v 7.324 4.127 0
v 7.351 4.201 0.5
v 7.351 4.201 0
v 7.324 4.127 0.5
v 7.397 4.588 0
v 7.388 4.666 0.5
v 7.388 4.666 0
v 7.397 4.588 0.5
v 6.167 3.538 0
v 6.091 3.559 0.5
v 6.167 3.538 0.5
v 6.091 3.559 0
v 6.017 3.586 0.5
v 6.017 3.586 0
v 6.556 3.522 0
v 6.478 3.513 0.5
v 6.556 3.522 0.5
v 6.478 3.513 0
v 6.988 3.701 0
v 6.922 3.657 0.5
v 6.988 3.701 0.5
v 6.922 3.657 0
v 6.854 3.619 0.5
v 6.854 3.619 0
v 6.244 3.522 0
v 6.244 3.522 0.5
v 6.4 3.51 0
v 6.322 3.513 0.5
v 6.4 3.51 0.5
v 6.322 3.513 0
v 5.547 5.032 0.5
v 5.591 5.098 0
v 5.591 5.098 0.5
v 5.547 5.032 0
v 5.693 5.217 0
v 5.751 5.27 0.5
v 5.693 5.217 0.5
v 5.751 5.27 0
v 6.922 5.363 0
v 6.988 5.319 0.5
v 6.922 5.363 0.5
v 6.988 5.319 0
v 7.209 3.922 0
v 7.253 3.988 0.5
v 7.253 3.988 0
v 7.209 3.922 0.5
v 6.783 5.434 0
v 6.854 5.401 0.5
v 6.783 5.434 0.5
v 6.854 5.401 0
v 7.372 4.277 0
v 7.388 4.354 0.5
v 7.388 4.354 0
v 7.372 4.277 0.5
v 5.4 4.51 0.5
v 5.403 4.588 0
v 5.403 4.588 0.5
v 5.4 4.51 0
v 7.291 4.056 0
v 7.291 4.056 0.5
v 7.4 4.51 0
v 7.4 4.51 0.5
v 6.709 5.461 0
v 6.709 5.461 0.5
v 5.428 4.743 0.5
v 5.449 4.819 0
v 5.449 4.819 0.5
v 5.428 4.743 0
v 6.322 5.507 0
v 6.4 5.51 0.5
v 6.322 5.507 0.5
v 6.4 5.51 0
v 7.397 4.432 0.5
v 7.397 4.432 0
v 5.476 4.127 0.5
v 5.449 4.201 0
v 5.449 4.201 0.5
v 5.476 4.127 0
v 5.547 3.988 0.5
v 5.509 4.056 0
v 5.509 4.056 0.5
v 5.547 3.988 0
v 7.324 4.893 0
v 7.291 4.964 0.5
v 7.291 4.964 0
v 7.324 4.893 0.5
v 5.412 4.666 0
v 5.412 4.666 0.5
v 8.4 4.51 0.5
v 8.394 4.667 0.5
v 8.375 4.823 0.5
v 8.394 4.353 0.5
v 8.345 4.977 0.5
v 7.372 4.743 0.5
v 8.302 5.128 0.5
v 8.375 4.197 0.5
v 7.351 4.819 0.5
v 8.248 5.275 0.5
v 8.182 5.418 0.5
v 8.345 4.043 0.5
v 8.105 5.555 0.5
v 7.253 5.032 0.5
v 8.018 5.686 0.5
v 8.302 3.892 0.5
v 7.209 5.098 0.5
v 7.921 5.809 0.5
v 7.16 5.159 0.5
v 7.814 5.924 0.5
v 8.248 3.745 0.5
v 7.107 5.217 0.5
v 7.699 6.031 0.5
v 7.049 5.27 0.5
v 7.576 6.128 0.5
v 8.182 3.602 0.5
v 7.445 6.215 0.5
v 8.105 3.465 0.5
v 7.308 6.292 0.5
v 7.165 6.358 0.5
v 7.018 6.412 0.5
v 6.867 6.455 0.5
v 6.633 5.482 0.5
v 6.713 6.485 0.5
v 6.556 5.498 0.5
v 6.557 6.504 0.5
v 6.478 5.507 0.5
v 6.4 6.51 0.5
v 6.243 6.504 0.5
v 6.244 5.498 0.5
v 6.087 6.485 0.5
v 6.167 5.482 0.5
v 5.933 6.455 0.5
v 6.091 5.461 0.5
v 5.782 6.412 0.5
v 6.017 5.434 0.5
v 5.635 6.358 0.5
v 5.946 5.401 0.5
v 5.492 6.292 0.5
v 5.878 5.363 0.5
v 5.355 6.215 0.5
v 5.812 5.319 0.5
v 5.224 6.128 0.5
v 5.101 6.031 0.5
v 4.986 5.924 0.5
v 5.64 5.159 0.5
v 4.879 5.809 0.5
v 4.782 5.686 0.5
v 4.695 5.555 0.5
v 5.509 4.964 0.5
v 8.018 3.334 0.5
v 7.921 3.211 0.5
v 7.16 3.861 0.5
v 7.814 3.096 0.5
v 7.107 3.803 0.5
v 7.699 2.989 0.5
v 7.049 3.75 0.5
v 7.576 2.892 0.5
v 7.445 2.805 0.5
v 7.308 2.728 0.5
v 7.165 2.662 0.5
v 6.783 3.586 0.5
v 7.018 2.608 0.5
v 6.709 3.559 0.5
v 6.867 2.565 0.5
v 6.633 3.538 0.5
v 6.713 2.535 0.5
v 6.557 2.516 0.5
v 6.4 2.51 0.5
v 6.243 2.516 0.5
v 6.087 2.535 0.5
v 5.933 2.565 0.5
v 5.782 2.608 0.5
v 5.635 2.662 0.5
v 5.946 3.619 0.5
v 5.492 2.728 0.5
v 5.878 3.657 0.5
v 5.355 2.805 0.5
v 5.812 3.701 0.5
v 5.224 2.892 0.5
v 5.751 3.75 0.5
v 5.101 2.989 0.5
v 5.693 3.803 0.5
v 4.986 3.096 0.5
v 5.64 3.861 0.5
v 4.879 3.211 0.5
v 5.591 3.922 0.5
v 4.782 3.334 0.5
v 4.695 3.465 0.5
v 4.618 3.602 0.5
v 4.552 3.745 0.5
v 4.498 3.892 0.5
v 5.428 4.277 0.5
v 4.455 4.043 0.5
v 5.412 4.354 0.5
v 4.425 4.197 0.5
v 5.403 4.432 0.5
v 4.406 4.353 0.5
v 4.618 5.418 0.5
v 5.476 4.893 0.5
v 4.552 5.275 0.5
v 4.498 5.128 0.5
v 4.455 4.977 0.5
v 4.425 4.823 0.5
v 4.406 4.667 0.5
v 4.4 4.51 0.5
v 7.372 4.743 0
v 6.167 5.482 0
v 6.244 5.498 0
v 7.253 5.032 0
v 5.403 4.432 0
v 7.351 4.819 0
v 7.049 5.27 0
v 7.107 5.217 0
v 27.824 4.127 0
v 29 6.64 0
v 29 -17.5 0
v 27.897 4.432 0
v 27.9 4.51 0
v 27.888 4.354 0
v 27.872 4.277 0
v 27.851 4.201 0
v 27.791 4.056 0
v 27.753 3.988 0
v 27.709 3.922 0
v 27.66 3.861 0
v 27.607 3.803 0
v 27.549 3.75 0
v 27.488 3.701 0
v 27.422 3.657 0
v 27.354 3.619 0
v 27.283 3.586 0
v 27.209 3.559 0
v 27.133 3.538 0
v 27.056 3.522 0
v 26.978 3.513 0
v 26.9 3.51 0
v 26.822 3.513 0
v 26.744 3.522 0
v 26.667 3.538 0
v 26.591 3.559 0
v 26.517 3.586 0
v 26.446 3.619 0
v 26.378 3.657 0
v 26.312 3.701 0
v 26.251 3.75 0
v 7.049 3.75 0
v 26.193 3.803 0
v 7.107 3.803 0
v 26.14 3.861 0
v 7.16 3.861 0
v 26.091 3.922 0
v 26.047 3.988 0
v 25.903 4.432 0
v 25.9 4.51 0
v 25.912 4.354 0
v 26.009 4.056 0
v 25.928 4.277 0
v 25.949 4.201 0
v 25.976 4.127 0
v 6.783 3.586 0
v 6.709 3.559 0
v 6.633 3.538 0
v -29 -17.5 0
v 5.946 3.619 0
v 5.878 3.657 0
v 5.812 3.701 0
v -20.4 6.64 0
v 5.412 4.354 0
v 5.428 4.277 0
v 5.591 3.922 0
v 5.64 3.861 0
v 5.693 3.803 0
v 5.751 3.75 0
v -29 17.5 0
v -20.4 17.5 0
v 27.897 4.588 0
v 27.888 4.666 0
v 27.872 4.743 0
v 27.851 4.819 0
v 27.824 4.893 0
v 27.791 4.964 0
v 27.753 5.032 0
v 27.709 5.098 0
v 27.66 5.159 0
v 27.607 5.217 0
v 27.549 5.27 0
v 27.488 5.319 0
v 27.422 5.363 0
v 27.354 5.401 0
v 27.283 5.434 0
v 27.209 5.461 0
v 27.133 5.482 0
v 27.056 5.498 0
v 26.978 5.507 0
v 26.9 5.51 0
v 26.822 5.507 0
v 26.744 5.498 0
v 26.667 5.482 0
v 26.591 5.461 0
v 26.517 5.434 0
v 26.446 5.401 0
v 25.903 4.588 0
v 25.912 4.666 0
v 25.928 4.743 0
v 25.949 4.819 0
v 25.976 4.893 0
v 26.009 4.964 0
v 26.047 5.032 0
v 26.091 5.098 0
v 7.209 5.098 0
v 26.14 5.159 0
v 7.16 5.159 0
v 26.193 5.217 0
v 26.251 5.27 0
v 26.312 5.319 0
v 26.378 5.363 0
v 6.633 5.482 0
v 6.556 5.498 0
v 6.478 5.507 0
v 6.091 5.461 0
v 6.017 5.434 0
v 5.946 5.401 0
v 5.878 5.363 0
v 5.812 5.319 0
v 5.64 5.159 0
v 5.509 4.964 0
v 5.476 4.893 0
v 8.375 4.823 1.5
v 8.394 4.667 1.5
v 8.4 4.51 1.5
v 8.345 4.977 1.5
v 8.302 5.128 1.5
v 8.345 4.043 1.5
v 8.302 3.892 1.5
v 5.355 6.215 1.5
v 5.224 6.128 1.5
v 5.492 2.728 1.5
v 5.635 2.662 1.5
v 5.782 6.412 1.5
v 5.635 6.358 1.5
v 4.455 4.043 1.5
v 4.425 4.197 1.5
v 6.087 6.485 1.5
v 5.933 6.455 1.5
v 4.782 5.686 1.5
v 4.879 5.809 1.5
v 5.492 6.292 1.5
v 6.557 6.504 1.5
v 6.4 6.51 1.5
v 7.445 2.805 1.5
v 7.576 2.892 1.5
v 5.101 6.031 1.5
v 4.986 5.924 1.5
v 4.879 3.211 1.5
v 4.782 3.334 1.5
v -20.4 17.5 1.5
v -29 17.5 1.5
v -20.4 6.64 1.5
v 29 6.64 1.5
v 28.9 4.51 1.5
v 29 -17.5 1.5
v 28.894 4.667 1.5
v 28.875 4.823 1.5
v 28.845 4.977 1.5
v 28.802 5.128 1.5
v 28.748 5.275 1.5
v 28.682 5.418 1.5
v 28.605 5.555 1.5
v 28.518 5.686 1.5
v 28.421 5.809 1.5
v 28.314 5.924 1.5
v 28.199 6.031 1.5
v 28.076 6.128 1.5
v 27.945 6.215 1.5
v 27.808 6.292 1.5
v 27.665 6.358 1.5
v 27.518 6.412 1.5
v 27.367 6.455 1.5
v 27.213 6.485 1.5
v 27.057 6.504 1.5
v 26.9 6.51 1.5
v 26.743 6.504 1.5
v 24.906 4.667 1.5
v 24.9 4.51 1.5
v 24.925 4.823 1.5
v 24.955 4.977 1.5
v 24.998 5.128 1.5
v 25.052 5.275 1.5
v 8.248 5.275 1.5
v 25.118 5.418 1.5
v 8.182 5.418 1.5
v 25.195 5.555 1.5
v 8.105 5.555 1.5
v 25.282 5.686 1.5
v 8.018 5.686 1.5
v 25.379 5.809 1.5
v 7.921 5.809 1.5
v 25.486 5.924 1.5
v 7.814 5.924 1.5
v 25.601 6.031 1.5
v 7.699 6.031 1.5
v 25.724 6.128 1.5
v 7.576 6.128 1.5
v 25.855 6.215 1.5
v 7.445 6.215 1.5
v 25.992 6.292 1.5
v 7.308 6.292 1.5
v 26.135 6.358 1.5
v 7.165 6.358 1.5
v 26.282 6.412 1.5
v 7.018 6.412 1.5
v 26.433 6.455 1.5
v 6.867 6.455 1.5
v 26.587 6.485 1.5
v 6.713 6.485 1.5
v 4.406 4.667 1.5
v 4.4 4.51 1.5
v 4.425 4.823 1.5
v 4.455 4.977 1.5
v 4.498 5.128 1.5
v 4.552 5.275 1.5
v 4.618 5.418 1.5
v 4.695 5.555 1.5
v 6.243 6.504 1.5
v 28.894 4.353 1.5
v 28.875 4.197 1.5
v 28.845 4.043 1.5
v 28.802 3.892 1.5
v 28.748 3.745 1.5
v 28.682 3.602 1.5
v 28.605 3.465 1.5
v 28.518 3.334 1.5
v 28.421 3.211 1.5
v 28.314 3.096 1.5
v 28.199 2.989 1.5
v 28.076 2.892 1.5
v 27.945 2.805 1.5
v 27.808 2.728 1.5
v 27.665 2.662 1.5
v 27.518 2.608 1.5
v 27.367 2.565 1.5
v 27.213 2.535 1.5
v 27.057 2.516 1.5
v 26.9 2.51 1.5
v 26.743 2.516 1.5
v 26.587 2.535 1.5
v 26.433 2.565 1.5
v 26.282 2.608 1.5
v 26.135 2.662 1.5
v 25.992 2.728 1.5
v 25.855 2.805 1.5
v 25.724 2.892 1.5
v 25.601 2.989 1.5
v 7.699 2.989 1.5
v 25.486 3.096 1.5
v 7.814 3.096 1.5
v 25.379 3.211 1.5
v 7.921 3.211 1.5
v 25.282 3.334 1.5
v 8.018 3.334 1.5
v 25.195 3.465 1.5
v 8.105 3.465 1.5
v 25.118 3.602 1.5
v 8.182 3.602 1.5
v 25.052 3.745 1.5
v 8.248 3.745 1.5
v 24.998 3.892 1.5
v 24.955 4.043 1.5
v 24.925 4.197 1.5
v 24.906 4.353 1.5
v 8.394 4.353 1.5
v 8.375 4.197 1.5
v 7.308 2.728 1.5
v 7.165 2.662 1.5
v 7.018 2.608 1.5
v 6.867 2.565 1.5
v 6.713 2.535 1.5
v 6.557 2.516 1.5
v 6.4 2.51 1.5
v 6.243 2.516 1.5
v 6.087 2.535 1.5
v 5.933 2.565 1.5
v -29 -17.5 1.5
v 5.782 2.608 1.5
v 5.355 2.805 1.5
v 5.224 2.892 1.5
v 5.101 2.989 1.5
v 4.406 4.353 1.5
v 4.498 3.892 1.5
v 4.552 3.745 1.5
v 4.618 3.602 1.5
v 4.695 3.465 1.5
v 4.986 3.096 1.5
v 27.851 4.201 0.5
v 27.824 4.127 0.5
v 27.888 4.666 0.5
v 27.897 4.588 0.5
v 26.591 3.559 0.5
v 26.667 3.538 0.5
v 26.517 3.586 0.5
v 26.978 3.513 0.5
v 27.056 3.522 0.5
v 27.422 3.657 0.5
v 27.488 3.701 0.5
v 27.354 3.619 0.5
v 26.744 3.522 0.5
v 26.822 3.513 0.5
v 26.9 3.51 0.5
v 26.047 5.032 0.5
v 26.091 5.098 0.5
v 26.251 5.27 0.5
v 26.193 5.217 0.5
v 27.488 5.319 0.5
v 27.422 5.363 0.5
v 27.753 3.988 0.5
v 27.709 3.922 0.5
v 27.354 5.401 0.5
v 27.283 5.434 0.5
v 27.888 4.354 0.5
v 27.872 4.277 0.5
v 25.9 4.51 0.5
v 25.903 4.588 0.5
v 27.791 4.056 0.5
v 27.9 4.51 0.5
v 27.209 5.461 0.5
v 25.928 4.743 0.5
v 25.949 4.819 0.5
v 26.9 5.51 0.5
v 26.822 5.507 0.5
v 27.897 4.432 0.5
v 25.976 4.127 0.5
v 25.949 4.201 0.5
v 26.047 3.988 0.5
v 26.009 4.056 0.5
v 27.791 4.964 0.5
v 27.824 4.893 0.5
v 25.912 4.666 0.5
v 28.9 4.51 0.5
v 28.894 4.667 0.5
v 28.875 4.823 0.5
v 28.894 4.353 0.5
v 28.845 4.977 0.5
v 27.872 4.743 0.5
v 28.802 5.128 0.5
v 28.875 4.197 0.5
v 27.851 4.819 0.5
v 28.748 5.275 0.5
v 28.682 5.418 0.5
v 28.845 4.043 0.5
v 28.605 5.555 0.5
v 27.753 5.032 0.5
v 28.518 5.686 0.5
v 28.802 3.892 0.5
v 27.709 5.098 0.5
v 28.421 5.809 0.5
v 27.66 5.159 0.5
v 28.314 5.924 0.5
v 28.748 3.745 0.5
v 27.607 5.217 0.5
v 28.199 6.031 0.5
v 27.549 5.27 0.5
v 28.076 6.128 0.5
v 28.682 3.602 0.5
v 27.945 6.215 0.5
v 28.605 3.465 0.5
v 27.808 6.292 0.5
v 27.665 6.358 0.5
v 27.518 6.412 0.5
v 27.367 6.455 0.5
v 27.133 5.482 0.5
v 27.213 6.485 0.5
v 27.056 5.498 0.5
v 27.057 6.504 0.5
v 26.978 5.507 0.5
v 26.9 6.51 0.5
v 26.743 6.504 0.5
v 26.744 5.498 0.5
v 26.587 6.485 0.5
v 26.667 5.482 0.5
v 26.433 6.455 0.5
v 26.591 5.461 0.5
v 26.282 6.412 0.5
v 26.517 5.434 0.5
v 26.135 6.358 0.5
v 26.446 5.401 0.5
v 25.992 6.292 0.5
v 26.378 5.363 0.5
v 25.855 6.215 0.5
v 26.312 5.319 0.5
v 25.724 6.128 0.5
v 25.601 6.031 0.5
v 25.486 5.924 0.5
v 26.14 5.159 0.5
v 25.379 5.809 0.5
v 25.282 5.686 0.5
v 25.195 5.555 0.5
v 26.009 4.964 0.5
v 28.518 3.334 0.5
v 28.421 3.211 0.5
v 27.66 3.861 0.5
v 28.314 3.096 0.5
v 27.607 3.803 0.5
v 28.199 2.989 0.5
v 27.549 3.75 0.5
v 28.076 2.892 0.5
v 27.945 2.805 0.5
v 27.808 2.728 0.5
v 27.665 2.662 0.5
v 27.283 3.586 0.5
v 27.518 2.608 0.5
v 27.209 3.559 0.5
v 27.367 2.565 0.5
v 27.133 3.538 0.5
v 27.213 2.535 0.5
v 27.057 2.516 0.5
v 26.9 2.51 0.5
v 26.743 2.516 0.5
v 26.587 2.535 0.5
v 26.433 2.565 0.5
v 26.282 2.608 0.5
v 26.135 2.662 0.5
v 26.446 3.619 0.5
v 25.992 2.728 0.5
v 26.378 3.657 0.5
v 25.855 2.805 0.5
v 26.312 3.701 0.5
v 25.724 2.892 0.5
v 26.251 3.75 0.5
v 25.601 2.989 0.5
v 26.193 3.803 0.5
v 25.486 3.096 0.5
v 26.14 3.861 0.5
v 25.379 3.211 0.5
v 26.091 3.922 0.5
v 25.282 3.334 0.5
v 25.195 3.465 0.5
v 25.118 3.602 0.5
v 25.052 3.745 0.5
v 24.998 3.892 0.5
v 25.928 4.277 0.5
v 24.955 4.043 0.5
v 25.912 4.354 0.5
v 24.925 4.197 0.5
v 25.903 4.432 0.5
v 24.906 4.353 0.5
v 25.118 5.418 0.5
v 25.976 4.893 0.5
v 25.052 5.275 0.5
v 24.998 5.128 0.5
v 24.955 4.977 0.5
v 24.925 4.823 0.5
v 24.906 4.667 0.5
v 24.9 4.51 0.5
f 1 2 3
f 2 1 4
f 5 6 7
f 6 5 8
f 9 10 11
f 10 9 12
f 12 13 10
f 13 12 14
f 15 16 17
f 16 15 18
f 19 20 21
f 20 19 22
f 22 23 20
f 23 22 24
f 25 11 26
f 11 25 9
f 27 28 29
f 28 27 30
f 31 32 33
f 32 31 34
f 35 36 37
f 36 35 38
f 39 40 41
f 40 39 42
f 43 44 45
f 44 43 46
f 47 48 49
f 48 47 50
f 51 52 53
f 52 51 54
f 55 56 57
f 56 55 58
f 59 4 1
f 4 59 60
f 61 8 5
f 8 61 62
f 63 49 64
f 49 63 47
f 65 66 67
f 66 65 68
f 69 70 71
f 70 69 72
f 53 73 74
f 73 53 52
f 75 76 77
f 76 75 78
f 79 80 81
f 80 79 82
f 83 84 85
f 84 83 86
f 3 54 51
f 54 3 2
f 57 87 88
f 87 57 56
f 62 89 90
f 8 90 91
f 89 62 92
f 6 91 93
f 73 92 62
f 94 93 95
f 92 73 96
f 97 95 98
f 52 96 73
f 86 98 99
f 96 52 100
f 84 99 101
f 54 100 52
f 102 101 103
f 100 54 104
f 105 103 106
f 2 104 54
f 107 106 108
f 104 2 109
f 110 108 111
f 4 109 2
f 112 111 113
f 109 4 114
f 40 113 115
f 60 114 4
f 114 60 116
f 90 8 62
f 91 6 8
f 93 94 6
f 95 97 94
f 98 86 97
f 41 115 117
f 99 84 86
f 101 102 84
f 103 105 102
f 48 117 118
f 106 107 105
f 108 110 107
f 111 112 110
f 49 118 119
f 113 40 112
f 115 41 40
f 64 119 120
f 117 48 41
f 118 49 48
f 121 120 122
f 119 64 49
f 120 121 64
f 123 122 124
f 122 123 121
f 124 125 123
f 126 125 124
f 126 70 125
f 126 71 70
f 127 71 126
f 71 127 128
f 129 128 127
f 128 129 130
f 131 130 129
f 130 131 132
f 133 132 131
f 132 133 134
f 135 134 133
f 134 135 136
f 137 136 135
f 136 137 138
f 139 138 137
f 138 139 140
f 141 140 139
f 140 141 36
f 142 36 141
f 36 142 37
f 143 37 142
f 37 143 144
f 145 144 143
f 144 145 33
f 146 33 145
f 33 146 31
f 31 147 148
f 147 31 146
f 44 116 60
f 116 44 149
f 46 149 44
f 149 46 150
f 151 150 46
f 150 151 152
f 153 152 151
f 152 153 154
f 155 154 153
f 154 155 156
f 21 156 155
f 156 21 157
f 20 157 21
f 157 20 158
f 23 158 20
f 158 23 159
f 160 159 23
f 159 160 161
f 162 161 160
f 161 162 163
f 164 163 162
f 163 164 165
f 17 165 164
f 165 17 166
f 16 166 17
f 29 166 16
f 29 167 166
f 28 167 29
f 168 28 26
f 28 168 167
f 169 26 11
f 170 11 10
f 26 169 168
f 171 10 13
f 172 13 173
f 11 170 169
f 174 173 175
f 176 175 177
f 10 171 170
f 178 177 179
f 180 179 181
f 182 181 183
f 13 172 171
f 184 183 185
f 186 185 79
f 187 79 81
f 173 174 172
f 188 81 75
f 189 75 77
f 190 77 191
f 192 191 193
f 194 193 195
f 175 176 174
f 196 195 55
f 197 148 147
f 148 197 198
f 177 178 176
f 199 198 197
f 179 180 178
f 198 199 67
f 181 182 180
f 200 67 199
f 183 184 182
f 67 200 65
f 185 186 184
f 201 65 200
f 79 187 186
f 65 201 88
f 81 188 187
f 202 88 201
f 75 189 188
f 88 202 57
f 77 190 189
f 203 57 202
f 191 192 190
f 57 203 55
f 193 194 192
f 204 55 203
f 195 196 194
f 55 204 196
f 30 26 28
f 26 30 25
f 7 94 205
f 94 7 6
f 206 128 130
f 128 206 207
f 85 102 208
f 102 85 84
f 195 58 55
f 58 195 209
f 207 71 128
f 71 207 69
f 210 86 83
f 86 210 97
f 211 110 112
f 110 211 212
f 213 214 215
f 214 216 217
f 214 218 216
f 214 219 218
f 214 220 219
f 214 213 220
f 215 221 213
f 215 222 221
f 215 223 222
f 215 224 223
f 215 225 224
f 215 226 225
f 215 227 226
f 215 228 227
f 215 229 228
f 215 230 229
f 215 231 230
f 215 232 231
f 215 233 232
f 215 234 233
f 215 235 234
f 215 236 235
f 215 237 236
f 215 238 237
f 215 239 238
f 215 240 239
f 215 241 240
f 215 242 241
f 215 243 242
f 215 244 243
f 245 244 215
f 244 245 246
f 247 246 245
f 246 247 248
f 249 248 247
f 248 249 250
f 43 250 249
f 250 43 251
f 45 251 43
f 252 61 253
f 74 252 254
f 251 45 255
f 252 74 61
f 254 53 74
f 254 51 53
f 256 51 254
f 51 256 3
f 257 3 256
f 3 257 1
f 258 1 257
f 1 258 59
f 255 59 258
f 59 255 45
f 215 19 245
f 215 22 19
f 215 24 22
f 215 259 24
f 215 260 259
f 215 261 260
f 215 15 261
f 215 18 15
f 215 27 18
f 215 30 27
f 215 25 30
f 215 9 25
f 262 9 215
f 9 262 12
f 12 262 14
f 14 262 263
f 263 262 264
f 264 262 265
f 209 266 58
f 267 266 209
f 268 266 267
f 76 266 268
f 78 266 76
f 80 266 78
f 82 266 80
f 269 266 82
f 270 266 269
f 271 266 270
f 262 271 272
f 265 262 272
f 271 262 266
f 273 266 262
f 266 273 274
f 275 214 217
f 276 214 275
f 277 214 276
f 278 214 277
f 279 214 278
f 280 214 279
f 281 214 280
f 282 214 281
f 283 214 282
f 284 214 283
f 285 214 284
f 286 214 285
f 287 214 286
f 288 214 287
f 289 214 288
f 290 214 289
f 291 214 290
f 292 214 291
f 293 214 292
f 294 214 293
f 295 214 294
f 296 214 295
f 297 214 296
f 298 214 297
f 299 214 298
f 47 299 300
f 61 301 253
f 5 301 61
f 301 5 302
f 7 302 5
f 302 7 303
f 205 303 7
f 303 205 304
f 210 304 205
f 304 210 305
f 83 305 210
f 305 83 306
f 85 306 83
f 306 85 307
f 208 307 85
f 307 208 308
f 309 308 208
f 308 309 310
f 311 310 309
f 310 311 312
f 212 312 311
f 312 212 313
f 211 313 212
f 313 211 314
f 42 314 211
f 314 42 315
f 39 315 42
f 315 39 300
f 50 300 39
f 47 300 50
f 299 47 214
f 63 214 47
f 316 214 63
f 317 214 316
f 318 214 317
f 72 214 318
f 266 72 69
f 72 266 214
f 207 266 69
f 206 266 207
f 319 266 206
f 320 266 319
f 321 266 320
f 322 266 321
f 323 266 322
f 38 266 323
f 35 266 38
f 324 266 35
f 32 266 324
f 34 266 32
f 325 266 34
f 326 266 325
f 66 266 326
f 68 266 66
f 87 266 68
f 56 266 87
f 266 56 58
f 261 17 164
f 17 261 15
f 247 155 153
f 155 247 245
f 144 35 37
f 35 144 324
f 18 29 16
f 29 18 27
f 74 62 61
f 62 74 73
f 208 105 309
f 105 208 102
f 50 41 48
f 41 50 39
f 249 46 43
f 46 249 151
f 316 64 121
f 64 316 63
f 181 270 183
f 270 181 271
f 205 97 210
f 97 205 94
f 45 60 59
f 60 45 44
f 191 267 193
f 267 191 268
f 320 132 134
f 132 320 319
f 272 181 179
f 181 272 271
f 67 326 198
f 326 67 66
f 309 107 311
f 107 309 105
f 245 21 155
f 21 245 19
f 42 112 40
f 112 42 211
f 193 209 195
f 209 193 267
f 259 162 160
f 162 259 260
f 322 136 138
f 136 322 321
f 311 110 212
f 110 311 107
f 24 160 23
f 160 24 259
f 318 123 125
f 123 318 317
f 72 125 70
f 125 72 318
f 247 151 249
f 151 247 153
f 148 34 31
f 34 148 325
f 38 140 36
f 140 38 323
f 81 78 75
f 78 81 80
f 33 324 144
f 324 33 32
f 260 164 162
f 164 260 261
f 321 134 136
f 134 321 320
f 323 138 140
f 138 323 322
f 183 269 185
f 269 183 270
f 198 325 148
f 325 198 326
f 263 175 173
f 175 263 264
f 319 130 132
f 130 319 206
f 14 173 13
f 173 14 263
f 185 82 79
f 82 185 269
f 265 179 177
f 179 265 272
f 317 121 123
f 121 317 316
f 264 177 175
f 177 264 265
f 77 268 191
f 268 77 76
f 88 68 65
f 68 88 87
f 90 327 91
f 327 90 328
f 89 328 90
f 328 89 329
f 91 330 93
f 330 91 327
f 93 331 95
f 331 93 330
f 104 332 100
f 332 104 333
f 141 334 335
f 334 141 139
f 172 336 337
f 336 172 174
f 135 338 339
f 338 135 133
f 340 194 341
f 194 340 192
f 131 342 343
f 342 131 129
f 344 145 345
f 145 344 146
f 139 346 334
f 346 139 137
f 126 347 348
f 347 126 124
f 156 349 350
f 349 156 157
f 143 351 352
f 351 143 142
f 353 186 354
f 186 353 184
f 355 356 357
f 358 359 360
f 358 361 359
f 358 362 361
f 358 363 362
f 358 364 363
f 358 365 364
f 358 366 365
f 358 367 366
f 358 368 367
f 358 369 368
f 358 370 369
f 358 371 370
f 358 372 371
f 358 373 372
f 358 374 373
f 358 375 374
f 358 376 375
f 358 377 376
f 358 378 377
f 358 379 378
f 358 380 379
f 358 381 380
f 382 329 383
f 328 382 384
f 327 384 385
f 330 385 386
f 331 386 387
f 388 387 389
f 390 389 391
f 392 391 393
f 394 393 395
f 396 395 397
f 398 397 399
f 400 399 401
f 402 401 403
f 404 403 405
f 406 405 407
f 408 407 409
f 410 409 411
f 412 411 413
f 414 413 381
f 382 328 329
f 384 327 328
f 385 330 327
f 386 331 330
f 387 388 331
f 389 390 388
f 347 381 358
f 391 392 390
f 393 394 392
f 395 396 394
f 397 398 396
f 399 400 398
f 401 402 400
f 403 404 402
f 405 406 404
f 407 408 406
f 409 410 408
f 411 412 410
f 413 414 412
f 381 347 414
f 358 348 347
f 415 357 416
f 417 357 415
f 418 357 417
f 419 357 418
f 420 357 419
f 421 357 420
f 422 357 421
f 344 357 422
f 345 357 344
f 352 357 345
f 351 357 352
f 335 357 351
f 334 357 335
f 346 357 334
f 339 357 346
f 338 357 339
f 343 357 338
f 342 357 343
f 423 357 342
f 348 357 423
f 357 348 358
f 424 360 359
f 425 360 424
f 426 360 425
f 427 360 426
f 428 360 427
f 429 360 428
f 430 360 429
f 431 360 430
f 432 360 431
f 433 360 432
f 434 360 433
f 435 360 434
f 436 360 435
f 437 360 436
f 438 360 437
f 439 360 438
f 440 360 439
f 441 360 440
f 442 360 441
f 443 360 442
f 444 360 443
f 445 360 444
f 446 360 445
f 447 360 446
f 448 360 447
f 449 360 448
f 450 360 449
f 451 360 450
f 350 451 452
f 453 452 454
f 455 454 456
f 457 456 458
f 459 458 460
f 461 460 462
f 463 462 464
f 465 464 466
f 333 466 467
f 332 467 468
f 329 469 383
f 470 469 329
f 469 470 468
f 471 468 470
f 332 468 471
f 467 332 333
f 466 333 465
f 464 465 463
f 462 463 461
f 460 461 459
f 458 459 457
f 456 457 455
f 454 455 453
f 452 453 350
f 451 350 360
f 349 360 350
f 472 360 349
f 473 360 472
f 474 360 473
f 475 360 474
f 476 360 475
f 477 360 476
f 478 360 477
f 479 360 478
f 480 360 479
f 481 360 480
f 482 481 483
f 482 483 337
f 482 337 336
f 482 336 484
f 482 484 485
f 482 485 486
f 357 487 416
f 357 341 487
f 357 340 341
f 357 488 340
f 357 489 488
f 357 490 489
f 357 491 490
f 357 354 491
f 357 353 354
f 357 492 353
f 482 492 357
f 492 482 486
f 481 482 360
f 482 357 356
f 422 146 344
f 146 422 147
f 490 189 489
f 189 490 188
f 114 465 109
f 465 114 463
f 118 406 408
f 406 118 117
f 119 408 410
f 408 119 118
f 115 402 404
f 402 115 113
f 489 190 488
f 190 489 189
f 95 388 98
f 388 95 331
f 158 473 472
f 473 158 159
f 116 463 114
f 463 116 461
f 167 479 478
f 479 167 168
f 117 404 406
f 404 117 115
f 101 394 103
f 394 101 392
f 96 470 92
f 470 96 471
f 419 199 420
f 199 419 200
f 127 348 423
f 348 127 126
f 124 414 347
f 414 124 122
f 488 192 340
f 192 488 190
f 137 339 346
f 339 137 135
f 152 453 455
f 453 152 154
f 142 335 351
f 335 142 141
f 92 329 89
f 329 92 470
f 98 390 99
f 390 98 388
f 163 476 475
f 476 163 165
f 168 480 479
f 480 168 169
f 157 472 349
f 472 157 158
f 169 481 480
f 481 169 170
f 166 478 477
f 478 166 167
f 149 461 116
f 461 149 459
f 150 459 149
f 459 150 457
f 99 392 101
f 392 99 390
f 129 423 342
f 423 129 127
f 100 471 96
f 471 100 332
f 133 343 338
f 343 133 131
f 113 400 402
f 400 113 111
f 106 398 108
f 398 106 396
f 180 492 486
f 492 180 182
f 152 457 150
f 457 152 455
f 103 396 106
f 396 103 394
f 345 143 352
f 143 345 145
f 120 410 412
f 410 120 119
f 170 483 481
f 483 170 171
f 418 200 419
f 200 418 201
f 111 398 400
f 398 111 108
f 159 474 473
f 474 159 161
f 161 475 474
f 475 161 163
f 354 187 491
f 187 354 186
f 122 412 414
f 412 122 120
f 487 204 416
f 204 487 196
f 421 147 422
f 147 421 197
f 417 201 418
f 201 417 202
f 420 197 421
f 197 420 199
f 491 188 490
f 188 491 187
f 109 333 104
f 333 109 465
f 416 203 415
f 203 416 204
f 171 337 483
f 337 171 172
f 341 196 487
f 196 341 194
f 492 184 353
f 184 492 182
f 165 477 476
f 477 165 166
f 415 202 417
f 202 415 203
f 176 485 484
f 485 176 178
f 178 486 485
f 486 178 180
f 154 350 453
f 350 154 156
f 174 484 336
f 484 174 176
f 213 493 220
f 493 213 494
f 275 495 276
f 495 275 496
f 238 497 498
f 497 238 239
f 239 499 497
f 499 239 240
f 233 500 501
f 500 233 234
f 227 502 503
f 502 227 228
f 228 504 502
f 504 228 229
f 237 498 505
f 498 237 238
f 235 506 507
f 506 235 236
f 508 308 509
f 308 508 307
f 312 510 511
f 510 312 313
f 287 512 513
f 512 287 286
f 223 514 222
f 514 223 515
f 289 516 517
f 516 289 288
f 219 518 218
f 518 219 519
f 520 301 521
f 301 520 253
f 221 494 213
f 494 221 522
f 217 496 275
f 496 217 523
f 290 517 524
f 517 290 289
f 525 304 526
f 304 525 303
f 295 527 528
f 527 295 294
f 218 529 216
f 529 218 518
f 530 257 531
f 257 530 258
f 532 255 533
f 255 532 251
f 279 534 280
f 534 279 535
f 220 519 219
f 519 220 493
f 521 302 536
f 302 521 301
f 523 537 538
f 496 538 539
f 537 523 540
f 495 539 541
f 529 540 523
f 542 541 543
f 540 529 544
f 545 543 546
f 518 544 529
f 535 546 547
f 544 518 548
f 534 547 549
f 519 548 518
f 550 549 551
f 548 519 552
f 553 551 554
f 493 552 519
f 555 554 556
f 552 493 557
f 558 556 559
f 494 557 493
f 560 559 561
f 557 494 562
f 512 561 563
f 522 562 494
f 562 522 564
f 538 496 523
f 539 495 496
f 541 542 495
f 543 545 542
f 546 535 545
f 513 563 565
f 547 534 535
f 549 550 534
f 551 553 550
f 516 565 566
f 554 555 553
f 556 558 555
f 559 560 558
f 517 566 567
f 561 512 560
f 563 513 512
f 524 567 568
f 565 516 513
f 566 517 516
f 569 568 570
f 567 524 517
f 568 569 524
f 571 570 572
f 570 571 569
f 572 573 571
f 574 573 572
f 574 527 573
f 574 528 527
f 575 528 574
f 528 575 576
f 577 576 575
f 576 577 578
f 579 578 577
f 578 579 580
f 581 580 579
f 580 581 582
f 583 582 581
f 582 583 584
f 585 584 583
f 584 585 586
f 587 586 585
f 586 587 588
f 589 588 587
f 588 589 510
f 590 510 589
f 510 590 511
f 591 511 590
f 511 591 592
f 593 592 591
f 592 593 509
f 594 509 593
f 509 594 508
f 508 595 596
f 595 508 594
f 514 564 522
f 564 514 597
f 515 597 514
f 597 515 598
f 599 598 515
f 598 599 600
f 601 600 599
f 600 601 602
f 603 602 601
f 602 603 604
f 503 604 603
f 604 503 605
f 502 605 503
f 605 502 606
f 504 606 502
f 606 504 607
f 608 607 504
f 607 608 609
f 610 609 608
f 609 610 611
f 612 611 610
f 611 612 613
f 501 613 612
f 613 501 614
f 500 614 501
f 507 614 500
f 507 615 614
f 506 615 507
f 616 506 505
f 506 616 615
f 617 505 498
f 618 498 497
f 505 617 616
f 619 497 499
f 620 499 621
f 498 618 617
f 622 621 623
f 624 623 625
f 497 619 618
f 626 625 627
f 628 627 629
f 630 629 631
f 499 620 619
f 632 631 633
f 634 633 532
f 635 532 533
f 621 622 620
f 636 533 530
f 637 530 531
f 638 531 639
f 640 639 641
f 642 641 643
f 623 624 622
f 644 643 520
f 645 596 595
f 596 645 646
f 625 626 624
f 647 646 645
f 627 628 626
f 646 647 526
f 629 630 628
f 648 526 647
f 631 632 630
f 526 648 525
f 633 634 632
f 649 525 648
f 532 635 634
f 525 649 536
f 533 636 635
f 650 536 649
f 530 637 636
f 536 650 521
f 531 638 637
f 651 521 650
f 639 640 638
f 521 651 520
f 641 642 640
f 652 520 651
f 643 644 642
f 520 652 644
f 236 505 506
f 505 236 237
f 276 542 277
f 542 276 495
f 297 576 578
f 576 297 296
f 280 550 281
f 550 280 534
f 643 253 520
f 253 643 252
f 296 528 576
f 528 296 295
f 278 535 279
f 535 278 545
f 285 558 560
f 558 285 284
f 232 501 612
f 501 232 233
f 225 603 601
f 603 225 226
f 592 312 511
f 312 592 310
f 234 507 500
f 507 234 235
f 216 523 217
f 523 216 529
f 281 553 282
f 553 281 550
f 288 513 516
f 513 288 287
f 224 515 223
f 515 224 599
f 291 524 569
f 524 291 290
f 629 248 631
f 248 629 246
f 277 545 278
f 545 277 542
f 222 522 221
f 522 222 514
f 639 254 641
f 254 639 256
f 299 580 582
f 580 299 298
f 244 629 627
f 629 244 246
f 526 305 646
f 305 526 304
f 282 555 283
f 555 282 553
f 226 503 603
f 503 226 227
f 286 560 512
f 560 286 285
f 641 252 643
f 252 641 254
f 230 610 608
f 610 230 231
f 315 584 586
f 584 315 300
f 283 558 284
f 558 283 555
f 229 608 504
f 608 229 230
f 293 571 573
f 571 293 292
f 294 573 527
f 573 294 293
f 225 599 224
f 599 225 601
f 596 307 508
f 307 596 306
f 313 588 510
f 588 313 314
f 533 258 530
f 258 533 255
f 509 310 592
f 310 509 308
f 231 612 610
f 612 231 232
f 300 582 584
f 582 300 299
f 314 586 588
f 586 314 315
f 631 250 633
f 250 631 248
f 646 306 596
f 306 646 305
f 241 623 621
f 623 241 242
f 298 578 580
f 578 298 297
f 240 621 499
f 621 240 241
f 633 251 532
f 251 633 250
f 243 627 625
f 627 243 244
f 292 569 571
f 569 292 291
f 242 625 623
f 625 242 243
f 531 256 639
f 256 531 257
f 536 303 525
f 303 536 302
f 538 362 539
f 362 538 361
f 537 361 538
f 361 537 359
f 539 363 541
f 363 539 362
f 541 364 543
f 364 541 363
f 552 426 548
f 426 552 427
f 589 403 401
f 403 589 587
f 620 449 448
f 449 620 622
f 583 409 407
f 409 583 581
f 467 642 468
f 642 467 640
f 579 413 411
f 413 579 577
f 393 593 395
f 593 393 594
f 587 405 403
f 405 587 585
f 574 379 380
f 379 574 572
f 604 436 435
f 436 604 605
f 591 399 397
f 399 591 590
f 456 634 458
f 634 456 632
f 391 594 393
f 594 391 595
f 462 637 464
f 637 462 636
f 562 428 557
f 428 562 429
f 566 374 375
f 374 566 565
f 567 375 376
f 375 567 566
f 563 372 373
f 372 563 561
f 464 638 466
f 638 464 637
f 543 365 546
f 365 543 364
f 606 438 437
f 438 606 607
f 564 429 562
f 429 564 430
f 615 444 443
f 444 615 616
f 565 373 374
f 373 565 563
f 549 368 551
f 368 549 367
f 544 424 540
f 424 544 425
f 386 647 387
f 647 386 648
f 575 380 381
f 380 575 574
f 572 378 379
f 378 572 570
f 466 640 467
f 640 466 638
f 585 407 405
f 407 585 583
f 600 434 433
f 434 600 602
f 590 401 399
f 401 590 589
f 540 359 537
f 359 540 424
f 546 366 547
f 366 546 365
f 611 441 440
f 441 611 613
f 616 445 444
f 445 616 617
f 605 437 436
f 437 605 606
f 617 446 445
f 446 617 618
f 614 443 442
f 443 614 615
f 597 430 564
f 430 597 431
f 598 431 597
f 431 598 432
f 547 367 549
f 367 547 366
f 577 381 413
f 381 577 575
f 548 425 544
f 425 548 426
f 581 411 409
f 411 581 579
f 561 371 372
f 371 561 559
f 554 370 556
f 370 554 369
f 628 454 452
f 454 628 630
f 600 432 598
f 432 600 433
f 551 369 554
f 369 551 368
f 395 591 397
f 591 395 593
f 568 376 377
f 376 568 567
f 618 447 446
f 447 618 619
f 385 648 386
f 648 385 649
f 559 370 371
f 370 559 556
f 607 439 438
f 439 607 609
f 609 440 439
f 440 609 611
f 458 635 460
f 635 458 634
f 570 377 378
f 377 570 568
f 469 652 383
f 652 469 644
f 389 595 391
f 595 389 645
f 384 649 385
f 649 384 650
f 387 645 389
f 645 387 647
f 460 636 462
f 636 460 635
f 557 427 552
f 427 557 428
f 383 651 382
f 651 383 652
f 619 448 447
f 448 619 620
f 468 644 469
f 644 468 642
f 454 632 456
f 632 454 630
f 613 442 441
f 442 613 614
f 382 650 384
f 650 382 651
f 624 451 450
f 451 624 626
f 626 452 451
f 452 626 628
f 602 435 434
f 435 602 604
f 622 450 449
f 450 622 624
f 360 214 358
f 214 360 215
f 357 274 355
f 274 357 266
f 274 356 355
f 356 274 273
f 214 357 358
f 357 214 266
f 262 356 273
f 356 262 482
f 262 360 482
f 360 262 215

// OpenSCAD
// file: BOSL2/std.scad
// Minimal BOSL2 compatibility shim for bundled gallery models.
// It implements only the helpers used by the imported OpenSCAD projects.

CENTER = [0, 0, 0];
BOTTOM = [0, 0, -1];
TOP = [0, 0, 1];
LEFT = [-1, 0, 0];
RIGHT = [1, 0, 0];
FRONT = [0, -1, 0];
BACK = [0, 1, 0];

module up(z=0) {
    translate([0, 0, z]) children();
}

module down(z=0) {
    translate([0, 0, -z]) children();
}

module attach(anchor=CENTER) {
    children();
}

module cuboid(size=[1, 1, 1], anchor=CENTER) {
    center = anchor == CENTER;
    translate(center ? [0, 0, 0] : [0, 0, size[2] / 2])
        cube(size, center=true);
    children();
}

module xcyl(h=1, r=1, anchor=CENTER) {
    center = anchor == CENTER;
    translate(center ? [0, 0, 0] : [h / 2, 0, 0])
        rotate([0, 90, 0])
            cylinder(h=h, r=r, center=true);
}
// main file
include <BOSL2/std.scad>

// Start config
// Panel Size
panel_size = [ 58, 35 ]; // mm
// Pi Board
pi_board_size = [ 51, 21 ];                                        // mm
pi_board_screw_holes_center_from_board_edge_distance = [ 2, 4.8 ]; // mm
pi_board_screw_holes_diameter = 2.1;                               // mm
pi_board_offset = [ 1.75, -6.56 ];
pi_board_usb_size = [ 8.5, 4.5 ];
pi_board_usb_rounding_radius = 0.5; // mm
// pi_board_inset_depth = 0.2; //mm (keep at zero for final)

// Screen
screen_pcb_size = [ 24.7, 27, 13.3 ];                                  // mm (+- 0.2) 13.3mm are pin headers.
screen_pcb_screw_holes_center_from_board_edge_distance = [ 2.1, 2.0 ]; // mm
screen_pcb_screw_holes_diameter = 2.8;                                 // mm
screen_pcb_screw_holes_spacing = [ 20.5, 23 ];                         // mm
active_screen_area = [ 21.74, 10.86 ];                                 // mm (old: 13.86)
active_screen_area_offset_from_corner = [ 1.48, 6.58 ];                // mm
screen_rounding_radius = 0.5;                                          // mm
screen_count = 2;

// Screws
m2_screw_head_depth = 1;   // mm it's 2mm normally
m2_screw_head_diameter = 4.0; // mm (adding .6mm for tolerances)
m2_screw_nut_depth = 1;    // mm it's 1.6mm normally
m2_screw_nut_diameter = 5.0;  // mm (adding .6mm for tolerances)
m2_screw_diameter = 2;        // mm

// Asanoha
asanoha_pattern_size = [ 40.7, 20.35 ]; // mm
asanoha_area_rounding_radius = 3;       // mm

// Stand
stand_size = [ 3, 6, 6 ];
stand_rounding_radius = 1.5;       // mm
stand_hinge_ball_diameter = 2;     // mm
stand_hinge_ball_offset = 0;       // mm
stand_panel_tolerance = 0.25;      // mm
stand_panel_thickness = 1.5;       // mm
stand_panel_rounding_radius = 1.5; // mm
stand_asanoha_pattern_unit_length = 10.175; // mm
stand_asanoha_repeat = [5,3];

// Misc
walls_depth = 9.5;     // mm
walls_thickness = 1.5; // mm
panel_thickness = 1.5; // mm
rounding_radius = 1.5; // mm

resolution = 80;
// End config

module panel()
{
    cuboid([ panel_size.x, panel_size.y, panel_thickness ], rounding = rounding_radius,
           edges = [ FRONT + RIGHT, FRONT + LEFT, BACK + RIGHT, BACK + LEFT ], $fn = resolution,
           anchor = LEFT + BOTTOM + FRONT);
}

module screw_hole(thread_depth = 10, head_depth = 1.5, head_diameter = 2, thread_diameter = 1.5)
{
    translate([ 0, 0, panel_thickness - thread_depth / 2 - head_depth ])
        cylinder(h = thread_depth, r = thread_diameter / 2, center = true, $fn = resolution);
    translate([ 0, 0, panel_thickness - head_depth / 2 ])
        cylinder(h = head_depth, r = head_diameter / 2, center = true, $fn = resolution);
}

module screen_screw_set()
{
    translate([ 0, 0 ])
        screw_hole(thread_depth = panel_thickness - m2_screw_head_depth, head_depth = m2_screw_head_depth,
                   head_diameter = m2_screw_head_diameter, thread_diameter = m2_screw_diameter);
    translate([ screen_pcb_screw_holes_spacing.x, 0, 0 ])
        screw_hole(thread_depth = panel_thickness - m2_screw_head_depth, head_depth = m2_screw_head_depth,
                   head_diameter = m2_screw_head_diameter, thread_diameter = m2_screw_diameter);
    translate([ 0, screen_pcb_screw_holes_spacing.y, 0 ])
        screw_hole(thread_depth = panel_thickness - m2_screw_head_depth, head_depth = m2_screw_head_depth,
                   head_diameter = m2_screw_head_diameter, thread_diameter = m2_screw_diameter);
    translate([ screen_pcb_screw_holes_spacing.x, screen_pcb_screw_holes_spacing.y, 0 ])
        screw_hole(thread_depth = panel_thickness - m2_screw_head_depth, head_depth = m2_screw_head_depth,
                   head_diameter = m2_screw_head_diameter, thread_diameter = m2_screw_diameter);
}

module screens()
{
    anchor_coords =
        [ panel_size.x / 2 - screen_pcb_size.x / 2 * screen_count, panel_size.y / 2 - active_screen_area.y / 2, 0 ];
    screw_dist = screen_pcb_screw_holes_center_from_board_edge_distance.y + screen_pcb_screw_holes_spacing.y -
                 active_screen_area_offset_from_corner.y - active_screen_area.y;
    screw_anchor_coords =
        [ anchor_coords.x + screen_pcb_screw_holes_center_from_board_edge_distance.x, anchor_coords.y - screw_dist, 0 ];
    translate(anchor_coords)
        cuboid([ screen_pcb_size.x * screen_count, active_screen_area.y, panel_thickness ],
               rounding = screen_rounding_radius, edges = [ FRONT + RIGHT, FRONT + LEFT, BACK + RIGHT, BACK + LEFT ],
               $fn = resolution, anchor = LEFT + BOTTOM + FRONT);
    for (i = [0:screen_count - 1])
    {
        translate(screw_anchor_coords) translate([ screen_pcb_size.x * i, 0, 0 ]) screen_screw_set();
    }
}

difference()
{
    panel();
    screens();
}
